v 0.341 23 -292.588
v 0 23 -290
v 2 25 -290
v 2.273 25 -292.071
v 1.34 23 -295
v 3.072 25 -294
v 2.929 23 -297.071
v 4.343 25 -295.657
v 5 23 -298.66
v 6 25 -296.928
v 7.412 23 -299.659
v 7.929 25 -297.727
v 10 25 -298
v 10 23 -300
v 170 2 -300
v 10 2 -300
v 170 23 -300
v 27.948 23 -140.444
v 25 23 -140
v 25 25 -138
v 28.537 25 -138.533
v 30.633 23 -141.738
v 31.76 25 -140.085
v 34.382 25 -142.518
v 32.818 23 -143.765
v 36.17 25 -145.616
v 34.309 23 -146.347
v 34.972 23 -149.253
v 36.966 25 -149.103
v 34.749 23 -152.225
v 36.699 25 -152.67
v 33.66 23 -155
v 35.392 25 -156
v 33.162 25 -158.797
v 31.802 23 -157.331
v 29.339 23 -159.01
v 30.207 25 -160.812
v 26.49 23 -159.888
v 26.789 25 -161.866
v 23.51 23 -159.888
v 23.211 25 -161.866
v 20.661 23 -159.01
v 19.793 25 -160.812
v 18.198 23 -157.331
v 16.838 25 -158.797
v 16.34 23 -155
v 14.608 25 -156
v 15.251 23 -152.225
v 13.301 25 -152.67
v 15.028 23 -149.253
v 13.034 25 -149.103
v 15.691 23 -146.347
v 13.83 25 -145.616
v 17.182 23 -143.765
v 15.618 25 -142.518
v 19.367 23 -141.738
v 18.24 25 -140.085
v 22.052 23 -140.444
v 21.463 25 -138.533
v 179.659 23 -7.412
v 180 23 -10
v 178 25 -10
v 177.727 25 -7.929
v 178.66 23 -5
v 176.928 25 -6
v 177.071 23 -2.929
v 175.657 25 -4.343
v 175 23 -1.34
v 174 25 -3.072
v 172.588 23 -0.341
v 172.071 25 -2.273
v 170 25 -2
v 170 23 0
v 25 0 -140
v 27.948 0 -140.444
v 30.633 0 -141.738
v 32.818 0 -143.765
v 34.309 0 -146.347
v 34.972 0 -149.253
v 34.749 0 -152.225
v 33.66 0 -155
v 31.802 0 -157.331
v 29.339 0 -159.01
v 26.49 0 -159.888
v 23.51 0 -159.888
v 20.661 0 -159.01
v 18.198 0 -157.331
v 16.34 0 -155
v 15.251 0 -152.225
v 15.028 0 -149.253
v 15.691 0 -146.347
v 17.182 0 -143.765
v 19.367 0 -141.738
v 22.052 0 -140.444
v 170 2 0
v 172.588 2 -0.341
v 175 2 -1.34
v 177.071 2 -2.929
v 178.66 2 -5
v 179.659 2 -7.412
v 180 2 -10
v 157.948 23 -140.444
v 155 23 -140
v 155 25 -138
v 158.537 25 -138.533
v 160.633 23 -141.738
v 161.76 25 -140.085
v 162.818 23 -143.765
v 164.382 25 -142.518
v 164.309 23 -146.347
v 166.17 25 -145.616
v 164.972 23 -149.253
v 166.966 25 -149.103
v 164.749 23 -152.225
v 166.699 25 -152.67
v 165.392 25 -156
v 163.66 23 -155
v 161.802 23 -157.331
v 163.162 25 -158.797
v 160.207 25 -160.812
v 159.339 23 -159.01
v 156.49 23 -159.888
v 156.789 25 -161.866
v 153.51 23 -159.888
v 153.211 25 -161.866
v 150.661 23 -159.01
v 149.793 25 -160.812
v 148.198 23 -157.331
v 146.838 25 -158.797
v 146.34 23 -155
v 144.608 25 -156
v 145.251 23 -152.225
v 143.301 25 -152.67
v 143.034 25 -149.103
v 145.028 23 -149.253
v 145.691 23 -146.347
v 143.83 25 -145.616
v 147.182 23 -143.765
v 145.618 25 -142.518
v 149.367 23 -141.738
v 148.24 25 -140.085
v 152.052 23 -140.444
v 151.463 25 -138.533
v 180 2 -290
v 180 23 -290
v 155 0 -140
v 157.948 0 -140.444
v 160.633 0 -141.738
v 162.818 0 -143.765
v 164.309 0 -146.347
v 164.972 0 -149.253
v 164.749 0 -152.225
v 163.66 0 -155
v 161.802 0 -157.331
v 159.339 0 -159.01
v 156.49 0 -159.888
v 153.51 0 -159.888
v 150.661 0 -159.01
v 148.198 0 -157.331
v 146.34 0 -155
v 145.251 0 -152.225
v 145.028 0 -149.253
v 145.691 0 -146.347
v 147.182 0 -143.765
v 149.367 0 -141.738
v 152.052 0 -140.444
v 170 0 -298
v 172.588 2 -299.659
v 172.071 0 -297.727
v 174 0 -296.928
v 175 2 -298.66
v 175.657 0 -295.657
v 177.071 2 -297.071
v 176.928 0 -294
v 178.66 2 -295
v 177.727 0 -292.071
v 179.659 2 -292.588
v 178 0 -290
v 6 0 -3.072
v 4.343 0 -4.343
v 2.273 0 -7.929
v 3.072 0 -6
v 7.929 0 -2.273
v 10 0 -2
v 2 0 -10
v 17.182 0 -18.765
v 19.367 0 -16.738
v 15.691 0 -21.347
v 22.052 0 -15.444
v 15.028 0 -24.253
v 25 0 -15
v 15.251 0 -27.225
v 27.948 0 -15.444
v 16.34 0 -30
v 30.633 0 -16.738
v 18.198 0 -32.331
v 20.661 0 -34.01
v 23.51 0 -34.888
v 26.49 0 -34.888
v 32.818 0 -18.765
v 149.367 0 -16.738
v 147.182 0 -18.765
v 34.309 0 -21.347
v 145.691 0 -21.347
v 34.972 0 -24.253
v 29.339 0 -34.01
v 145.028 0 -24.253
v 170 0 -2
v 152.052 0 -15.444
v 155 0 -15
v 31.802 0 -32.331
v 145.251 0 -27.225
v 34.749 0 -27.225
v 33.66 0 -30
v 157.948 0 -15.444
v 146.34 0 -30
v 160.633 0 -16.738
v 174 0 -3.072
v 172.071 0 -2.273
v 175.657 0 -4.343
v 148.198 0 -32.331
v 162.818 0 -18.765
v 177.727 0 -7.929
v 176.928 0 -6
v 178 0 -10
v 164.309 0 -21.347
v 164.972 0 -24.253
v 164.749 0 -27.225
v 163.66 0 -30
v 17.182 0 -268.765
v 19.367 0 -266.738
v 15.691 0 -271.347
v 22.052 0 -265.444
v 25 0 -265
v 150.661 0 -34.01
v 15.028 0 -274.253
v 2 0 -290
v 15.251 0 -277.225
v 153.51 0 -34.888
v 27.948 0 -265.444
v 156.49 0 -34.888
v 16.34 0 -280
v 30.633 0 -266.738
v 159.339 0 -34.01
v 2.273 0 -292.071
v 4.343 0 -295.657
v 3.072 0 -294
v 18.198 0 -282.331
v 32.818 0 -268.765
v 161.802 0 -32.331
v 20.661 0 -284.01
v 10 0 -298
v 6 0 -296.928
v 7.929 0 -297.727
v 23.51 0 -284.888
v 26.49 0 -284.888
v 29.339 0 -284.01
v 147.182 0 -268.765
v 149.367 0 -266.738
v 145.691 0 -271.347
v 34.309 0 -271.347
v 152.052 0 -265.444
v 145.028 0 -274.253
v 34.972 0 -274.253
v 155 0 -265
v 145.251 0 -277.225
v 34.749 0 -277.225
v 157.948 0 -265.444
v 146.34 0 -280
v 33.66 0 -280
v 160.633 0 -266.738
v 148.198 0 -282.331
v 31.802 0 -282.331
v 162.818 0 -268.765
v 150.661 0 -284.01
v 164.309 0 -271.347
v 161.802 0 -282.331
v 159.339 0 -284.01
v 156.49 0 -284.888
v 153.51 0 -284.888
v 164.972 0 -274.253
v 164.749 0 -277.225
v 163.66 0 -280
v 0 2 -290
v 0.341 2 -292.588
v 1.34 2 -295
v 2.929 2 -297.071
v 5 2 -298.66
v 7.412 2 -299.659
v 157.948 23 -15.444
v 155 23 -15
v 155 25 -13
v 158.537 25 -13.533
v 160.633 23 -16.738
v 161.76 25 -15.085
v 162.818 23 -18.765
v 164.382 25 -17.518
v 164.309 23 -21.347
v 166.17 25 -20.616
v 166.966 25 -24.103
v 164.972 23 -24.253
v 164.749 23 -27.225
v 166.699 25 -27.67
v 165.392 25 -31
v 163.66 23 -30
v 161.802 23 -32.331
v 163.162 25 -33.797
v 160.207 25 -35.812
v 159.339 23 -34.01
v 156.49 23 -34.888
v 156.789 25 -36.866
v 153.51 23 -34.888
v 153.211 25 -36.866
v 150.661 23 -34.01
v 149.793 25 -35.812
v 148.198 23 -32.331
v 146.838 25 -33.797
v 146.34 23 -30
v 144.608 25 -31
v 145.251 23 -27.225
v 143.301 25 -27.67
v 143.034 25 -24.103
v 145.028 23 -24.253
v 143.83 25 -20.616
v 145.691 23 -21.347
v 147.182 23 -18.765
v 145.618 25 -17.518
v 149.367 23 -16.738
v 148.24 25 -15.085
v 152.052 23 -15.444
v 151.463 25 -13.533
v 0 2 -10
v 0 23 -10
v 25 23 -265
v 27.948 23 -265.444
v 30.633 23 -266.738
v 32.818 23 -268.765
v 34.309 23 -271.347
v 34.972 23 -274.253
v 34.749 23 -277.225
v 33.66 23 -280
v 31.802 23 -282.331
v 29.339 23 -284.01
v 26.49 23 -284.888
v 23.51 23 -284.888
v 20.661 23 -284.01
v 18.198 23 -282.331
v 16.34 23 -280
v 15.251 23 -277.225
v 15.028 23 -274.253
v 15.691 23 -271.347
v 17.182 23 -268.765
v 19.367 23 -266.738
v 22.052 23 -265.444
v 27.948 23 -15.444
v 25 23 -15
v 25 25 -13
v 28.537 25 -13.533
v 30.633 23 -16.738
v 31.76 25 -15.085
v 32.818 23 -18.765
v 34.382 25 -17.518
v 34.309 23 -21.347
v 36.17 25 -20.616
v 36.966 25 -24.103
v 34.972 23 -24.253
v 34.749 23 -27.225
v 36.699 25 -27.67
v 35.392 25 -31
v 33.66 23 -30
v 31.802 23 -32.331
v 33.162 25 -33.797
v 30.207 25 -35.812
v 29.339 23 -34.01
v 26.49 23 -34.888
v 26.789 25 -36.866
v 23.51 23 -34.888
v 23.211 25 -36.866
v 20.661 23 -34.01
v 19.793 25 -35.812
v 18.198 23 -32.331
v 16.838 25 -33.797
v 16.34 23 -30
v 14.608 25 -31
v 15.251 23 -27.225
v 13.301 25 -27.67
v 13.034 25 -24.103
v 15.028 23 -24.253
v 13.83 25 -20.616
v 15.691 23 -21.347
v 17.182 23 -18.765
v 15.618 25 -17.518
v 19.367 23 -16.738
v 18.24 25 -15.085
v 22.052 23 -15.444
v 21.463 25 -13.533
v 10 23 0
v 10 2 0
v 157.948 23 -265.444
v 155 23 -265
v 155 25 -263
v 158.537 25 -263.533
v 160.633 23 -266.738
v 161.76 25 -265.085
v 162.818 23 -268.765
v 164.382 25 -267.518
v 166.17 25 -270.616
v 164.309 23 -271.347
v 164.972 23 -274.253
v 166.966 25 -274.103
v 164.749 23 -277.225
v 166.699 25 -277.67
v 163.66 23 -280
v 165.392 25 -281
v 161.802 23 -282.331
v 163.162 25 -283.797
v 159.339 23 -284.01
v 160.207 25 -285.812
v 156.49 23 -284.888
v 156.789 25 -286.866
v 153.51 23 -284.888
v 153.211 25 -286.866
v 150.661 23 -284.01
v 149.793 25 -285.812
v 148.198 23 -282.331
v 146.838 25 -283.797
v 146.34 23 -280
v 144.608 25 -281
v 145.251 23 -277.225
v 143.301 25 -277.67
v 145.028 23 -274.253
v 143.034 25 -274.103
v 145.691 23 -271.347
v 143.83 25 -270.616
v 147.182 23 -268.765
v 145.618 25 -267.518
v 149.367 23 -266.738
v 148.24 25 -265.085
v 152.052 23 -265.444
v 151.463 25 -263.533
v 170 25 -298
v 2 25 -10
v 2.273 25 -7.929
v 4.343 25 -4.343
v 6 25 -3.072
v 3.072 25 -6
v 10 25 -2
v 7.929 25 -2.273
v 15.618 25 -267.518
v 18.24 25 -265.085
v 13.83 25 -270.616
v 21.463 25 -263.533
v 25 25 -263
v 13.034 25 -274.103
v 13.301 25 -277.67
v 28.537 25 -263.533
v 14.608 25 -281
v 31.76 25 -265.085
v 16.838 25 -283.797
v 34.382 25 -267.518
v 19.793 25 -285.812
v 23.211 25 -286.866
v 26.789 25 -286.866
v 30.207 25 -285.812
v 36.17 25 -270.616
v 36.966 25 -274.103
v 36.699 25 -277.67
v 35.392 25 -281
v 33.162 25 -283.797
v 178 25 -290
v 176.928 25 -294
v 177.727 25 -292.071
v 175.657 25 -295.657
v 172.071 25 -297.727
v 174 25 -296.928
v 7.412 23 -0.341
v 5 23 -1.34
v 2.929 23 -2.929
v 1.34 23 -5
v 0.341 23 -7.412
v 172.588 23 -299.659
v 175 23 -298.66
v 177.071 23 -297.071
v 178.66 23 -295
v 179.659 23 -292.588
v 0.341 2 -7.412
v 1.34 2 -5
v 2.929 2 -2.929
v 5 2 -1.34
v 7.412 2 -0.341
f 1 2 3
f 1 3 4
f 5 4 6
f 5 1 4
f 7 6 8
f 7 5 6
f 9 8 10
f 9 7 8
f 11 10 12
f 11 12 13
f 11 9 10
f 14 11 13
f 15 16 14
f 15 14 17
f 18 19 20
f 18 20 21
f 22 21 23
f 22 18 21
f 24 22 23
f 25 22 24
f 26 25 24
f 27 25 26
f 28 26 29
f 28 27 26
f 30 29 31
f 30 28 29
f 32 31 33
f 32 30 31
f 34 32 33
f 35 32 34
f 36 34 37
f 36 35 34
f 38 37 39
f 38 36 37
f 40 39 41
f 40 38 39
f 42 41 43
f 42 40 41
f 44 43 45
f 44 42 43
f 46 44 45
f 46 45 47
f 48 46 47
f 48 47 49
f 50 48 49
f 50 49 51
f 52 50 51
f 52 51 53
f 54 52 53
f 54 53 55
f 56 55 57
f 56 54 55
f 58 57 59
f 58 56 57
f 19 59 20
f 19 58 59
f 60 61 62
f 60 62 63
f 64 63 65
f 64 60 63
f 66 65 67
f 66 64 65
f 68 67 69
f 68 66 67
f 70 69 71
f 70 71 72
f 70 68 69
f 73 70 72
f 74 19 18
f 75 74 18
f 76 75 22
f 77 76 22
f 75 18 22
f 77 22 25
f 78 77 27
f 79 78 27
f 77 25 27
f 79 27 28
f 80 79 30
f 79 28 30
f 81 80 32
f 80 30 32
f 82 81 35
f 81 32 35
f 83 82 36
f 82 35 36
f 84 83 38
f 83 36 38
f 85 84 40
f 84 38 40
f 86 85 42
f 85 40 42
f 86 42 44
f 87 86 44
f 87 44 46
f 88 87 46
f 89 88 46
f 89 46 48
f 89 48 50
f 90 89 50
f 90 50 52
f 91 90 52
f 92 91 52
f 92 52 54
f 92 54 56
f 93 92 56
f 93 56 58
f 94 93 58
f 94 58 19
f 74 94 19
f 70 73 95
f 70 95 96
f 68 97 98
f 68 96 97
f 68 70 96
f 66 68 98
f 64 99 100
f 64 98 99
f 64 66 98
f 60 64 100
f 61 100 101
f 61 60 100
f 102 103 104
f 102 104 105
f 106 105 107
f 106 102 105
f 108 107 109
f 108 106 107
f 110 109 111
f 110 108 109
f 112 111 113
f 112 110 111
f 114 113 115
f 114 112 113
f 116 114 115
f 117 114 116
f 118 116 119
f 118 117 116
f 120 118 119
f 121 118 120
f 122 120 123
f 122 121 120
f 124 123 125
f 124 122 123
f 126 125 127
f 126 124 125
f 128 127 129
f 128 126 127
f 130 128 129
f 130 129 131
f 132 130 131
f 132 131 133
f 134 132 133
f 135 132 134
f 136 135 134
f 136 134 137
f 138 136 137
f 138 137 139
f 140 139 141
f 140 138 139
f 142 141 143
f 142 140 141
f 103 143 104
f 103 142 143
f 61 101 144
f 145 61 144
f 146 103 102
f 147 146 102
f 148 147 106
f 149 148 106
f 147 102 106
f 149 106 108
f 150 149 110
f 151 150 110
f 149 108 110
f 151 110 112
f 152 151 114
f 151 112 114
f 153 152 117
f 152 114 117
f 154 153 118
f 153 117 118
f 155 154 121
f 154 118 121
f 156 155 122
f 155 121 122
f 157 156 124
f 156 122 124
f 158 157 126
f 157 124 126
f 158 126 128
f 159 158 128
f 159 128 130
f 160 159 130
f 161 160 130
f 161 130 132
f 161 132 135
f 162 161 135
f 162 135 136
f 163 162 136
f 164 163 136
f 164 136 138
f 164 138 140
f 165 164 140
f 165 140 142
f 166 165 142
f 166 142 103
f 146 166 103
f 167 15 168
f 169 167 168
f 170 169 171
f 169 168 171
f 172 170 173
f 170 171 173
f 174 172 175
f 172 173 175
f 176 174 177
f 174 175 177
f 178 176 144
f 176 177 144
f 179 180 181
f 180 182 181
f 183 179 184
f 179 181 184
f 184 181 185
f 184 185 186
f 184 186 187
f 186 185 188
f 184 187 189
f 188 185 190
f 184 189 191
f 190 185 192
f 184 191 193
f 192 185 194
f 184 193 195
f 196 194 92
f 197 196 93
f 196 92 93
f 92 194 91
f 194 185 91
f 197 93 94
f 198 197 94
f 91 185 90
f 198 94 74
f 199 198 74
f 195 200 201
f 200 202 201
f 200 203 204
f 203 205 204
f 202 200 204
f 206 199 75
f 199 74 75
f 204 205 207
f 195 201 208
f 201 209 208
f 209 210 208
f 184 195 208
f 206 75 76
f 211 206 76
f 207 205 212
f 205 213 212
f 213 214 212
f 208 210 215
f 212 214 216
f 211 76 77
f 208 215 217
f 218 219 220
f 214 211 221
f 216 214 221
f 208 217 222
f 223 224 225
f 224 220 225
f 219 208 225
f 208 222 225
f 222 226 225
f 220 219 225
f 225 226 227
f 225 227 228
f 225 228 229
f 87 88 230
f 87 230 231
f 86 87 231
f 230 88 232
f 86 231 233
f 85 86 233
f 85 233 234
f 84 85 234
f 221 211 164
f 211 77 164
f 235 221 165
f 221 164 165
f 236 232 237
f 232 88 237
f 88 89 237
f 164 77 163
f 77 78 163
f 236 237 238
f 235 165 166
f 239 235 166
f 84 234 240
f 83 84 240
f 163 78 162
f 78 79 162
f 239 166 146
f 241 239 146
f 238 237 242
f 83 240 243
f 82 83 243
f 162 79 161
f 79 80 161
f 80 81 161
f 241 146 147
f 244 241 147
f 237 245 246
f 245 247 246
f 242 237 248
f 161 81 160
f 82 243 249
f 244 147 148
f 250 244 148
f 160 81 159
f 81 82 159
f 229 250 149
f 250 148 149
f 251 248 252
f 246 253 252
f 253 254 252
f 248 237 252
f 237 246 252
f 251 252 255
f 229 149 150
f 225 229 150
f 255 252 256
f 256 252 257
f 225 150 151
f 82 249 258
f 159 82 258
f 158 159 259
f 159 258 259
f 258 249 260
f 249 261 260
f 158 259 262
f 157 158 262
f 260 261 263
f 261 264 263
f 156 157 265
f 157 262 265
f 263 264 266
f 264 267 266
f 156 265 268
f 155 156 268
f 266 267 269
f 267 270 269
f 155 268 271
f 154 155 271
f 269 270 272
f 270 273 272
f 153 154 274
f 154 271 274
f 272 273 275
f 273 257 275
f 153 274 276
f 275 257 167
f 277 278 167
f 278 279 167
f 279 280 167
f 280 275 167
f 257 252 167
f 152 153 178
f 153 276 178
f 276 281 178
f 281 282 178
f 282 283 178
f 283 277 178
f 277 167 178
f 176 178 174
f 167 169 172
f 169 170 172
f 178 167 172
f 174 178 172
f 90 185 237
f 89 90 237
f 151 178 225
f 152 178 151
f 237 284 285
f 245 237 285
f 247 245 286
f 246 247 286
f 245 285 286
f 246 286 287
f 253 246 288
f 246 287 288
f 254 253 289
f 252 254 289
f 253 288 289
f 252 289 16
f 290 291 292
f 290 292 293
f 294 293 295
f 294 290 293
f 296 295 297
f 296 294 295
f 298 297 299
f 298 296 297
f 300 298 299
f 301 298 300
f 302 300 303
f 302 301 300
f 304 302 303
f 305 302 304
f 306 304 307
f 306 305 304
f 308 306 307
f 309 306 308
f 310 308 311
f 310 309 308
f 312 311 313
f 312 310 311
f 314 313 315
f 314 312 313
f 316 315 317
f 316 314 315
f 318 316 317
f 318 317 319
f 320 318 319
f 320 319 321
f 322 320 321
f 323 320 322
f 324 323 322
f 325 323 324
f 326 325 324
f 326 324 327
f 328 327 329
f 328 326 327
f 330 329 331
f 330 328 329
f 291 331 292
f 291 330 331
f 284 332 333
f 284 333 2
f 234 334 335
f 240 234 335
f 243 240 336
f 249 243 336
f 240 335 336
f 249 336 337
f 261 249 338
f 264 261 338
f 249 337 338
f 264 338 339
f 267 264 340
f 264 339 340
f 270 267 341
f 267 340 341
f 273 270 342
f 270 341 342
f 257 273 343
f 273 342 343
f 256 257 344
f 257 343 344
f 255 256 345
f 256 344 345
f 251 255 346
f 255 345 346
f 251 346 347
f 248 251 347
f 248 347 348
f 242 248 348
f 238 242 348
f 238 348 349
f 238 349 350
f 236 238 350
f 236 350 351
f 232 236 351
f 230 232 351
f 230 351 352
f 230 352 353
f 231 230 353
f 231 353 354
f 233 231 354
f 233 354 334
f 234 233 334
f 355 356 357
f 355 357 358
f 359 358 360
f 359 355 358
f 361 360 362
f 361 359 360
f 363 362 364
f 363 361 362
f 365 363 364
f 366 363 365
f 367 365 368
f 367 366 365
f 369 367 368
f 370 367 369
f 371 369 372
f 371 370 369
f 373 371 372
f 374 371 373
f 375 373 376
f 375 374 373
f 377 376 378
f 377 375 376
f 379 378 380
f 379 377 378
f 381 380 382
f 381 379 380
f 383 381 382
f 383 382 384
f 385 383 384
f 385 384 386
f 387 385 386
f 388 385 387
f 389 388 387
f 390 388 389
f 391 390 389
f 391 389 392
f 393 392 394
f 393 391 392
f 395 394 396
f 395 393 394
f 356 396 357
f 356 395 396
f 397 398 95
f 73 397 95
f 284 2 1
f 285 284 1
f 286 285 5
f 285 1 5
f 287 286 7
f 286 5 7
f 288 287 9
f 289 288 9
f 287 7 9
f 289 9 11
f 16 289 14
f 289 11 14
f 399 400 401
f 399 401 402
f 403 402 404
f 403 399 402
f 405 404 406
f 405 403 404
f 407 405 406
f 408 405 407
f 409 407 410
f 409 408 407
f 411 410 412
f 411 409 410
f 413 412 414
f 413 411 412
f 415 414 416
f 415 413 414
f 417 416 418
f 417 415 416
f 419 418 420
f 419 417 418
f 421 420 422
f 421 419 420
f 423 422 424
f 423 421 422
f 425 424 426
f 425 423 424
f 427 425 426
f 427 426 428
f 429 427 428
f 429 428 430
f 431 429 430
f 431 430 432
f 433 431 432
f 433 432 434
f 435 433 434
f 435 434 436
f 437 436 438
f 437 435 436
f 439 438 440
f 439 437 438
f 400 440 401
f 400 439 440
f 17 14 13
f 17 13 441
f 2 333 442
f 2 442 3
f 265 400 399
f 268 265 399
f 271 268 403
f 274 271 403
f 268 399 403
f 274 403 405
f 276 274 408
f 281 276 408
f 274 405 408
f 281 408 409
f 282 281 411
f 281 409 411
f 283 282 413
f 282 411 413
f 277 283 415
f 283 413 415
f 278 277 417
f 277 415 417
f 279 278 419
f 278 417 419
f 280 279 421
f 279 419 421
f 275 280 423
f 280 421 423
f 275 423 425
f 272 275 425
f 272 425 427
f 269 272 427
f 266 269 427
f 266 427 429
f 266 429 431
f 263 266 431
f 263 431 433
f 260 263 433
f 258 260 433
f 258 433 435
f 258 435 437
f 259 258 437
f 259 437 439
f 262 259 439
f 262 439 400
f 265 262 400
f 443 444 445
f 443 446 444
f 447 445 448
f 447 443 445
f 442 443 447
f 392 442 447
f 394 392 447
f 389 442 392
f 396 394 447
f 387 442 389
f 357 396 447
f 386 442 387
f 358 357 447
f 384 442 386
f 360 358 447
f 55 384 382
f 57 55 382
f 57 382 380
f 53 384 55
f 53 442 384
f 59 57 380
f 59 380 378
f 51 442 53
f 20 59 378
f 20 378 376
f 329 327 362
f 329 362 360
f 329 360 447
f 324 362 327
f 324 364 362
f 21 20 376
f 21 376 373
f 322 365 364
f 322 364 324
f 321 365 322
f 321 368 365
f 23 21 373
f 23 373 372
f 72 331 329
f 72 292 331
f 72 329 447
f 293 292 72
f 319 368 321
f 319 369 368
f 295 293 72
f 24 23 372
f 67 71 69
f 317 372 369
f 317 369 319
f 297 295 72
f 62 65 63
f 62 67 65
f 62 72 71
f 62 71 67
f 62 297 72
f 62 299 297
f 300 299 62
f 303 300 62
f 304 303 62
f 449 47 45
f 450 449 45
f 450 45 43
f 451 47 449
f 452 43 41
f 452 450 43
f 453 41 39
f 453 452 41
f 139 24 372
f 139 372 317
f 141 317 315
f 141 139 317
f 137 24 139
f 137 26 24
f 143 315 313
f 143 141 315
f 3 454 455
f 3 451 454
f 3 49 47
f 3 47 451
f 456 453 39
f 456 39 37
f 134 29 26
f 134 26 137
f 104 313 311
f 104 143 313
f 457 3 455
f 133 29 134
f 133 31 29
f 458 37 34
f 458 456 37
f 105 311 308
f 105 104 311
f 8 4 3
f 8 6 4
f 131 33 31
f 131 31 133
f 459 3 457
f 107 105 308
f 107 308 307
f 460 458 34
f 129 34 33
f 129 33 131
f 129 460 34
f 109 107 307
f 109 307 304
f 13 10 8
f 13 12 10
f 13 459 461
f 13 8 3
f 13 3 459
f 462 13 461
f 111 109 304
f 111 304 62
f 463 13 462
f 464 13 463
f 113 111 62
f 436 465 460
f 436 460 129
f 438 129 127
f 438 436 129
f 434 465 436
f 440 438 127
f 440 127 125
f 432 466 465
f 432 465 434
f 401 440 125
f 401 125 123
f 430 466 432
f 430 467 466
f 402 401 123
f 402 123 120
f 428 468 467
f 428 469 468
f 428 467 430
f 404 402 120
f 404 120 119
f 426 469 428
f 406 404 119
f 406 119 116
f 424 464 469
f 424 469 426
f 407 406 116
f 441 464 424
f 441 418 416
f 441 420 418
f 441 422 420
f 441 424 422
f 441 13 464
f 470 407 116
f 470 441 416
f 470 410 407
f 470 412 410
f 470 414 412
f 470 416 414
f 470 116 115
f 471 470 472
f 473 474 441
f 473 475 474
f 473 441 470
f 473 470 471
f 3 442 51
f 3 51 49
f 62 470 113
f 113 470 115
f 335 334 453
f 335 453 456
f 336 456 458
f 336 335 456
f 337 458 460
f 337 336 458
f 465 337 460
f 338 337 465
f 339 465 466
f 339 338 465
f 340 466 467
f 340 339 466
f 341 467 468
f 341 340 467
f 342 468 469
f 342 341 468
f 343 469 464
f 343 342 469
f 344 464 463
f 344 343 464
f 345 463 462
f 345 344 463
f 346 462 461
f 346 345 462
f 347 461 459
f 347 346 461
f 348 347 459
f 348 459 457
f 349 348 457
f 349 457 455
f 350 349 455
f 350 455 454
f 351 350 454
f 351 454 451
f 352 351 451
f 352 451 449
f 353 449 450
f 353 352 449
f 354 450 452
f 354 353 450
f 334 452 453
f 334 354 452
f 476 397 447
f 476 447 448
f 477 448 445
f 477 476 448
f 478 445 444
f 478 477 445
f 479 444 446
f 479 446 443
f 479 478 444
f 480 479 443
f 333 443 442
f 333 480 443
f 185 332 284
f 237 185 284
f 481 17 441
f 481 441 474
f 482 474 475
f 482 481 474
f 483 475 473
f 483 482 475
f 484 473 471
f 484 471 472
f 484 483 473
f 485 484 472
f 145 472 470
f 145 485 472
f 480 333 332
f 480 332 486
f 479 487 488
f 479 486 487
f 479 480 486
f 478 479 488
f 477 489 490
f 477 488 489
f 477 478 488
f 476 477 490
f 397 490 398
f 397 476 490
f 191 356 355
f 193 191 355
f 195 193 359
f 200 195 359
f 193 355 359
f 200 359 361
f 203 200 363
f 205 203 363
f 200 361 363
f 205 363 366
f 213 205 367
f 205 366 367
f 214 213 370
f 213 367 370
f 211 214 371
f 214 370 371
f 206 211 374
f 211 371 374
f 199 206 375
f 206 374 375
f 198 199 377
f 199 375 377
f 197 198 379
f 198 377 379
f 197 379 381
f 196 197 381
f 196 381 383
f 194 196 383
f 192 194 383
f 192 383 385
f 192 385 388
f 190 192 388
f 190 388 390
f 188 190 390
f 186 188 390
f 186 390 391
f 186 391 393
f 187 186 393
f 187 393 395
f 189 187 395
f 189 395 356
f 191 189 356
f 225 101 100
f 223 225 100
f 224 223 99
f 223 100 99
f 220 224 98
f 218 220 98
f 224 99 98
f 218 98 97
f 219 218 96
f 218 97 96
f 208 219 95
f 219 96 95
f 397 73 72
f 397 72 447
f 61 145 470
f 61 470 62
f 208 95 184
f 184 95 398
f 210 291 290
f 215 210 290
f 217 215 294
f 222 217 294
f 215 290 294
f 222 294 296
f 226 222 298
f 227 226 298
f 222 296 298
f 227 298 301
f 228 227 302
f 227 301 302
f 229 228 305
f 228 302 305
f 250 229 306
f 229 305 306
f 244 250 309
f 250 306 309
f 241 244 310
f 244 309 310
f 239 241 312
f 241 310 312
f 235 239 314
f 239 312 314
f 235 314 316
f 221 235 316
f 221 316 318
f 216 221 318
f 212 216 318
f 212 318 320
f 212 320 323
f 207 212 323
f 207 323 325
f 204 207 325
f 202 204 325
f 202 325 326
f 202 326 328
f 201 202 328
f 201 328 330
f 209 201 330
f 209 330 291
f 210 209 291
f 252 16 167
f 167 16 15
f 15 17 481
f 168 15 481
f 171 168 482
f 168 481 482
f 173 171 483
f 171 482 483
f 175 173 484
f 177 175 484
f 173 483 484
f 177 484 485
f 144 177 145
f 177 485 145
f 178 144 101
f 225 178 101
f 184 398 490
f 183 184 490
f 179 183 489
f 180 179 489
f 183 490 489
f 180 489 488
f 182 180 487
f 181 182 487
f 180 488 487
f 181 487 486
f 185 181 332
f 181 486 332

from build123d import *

# Parameters (mm, degrees)
SKETCH1_W           = 180
SKETCH1_H           = 300
BOSS_EXTRUDE1_DEPTH = 25
SKETCH2_R           = 10
CUT_EXTRUDE1_DEPTH  = 351.749198146
FILLET1_R           = 10
CHAMFER2_SIZE       = 2
CHAMFER3_SIZE       = 2


with BuildPart() as part:
    # Sketch1 → Boss-Extrude1 (new body)
    with BuildSketch(Plane(origin=(0, 0, 0), x_dir=(1, 0, 0), z_dir=(0, 1, 0))):
        with Locations((90, 150)):
            Rectangle(SKETCH1_W, SKETCH1_H)
    extrude(amount=BOSS_EXTRUDE1_DEPTH)

    # Sketch2 → Cut-Extrude1 (cut, through all)
    with BuildSketch(Plane(origin=(0, 25, 0), x_dir=(1, 0, 0), z_dir=(0, 1, 0))):
        with Locations(Location((25, 25, 0), (0, 0, 270))):
            Circle(SKETCH2_R)
        with Locations(Location((155, 25, 0), (0, 0, 270))):
            Circle(SKETCH2_R)
        with Locations(Location((155, 150, 0), (0, 0, 270))):
            Circle(SKETCH2_R)
        with Locations(Location((155, 275, 0), (0, 0, 270))):
            Circle(SKETCH2_R)
        with Locations(Location((25, 150, 0), (0, 0, 270))):
            Circle(SKETCH2_R)
        with Locations(Location((25, 275, 0), (0, 0, 270))):
            Circle(SKETCH2_R)
    extrude(amount=-CUT_EXTRUDE1_DEPTH, mode=Mode.SUBTRACT)

    # Fillet1
    fillet1_edges = [part.edges().sort_by_distance(p)[0] for p in [
        (0, 12.5, -300),
        (180, 12.5, -300),
        (180, 12.5, 0),
        (0, 12.5, 0),
    ]]
    fillet(fillet1_edges, radius=FILLET1_R)

    # Chamfer2
    chamfer2_edges = [part.edges().sort_by_distance(p)[0] for p in [
        (90, 0, -300),
        (90, 25, -300),
        (0, 0, -150),
        (180, 0, -150),
        (90, 0, 0),
        (177.071067812, 0, -2.928932188),
        (2.928932188, 0, -2.928932188),
        (2.928932188, 0, -297.071067812),
        (177.071067812, 0, -297.071067812),
        (180, 25, -150),
        (0, 25, -150),
        (90, 25, 0),
        (177.071067812, 25, -2.928932188),
        (2.928932188, 25, -2.928932188),
        (2.928932188, 25, -297.071067812),
        (177.071067812, 25, -297.071067812),
    ]]
    chamfer(chamfer2_edges, length=CHAMFER2_SIZE)

    # Chamfer3
    chamfer3_edges = [part.edges().sort_by_distance(p)[0] for p in [
        (25, 25, -160),
        (155, 25, -285),
        (155, 25, -160),
        (155, 25, -35),
        (25, 25, -285),
        (25, 25, -35),
    ]]
    chamfer(chamfer3_edges, length=CHAMFER3_SIZE)


solid = part.part
